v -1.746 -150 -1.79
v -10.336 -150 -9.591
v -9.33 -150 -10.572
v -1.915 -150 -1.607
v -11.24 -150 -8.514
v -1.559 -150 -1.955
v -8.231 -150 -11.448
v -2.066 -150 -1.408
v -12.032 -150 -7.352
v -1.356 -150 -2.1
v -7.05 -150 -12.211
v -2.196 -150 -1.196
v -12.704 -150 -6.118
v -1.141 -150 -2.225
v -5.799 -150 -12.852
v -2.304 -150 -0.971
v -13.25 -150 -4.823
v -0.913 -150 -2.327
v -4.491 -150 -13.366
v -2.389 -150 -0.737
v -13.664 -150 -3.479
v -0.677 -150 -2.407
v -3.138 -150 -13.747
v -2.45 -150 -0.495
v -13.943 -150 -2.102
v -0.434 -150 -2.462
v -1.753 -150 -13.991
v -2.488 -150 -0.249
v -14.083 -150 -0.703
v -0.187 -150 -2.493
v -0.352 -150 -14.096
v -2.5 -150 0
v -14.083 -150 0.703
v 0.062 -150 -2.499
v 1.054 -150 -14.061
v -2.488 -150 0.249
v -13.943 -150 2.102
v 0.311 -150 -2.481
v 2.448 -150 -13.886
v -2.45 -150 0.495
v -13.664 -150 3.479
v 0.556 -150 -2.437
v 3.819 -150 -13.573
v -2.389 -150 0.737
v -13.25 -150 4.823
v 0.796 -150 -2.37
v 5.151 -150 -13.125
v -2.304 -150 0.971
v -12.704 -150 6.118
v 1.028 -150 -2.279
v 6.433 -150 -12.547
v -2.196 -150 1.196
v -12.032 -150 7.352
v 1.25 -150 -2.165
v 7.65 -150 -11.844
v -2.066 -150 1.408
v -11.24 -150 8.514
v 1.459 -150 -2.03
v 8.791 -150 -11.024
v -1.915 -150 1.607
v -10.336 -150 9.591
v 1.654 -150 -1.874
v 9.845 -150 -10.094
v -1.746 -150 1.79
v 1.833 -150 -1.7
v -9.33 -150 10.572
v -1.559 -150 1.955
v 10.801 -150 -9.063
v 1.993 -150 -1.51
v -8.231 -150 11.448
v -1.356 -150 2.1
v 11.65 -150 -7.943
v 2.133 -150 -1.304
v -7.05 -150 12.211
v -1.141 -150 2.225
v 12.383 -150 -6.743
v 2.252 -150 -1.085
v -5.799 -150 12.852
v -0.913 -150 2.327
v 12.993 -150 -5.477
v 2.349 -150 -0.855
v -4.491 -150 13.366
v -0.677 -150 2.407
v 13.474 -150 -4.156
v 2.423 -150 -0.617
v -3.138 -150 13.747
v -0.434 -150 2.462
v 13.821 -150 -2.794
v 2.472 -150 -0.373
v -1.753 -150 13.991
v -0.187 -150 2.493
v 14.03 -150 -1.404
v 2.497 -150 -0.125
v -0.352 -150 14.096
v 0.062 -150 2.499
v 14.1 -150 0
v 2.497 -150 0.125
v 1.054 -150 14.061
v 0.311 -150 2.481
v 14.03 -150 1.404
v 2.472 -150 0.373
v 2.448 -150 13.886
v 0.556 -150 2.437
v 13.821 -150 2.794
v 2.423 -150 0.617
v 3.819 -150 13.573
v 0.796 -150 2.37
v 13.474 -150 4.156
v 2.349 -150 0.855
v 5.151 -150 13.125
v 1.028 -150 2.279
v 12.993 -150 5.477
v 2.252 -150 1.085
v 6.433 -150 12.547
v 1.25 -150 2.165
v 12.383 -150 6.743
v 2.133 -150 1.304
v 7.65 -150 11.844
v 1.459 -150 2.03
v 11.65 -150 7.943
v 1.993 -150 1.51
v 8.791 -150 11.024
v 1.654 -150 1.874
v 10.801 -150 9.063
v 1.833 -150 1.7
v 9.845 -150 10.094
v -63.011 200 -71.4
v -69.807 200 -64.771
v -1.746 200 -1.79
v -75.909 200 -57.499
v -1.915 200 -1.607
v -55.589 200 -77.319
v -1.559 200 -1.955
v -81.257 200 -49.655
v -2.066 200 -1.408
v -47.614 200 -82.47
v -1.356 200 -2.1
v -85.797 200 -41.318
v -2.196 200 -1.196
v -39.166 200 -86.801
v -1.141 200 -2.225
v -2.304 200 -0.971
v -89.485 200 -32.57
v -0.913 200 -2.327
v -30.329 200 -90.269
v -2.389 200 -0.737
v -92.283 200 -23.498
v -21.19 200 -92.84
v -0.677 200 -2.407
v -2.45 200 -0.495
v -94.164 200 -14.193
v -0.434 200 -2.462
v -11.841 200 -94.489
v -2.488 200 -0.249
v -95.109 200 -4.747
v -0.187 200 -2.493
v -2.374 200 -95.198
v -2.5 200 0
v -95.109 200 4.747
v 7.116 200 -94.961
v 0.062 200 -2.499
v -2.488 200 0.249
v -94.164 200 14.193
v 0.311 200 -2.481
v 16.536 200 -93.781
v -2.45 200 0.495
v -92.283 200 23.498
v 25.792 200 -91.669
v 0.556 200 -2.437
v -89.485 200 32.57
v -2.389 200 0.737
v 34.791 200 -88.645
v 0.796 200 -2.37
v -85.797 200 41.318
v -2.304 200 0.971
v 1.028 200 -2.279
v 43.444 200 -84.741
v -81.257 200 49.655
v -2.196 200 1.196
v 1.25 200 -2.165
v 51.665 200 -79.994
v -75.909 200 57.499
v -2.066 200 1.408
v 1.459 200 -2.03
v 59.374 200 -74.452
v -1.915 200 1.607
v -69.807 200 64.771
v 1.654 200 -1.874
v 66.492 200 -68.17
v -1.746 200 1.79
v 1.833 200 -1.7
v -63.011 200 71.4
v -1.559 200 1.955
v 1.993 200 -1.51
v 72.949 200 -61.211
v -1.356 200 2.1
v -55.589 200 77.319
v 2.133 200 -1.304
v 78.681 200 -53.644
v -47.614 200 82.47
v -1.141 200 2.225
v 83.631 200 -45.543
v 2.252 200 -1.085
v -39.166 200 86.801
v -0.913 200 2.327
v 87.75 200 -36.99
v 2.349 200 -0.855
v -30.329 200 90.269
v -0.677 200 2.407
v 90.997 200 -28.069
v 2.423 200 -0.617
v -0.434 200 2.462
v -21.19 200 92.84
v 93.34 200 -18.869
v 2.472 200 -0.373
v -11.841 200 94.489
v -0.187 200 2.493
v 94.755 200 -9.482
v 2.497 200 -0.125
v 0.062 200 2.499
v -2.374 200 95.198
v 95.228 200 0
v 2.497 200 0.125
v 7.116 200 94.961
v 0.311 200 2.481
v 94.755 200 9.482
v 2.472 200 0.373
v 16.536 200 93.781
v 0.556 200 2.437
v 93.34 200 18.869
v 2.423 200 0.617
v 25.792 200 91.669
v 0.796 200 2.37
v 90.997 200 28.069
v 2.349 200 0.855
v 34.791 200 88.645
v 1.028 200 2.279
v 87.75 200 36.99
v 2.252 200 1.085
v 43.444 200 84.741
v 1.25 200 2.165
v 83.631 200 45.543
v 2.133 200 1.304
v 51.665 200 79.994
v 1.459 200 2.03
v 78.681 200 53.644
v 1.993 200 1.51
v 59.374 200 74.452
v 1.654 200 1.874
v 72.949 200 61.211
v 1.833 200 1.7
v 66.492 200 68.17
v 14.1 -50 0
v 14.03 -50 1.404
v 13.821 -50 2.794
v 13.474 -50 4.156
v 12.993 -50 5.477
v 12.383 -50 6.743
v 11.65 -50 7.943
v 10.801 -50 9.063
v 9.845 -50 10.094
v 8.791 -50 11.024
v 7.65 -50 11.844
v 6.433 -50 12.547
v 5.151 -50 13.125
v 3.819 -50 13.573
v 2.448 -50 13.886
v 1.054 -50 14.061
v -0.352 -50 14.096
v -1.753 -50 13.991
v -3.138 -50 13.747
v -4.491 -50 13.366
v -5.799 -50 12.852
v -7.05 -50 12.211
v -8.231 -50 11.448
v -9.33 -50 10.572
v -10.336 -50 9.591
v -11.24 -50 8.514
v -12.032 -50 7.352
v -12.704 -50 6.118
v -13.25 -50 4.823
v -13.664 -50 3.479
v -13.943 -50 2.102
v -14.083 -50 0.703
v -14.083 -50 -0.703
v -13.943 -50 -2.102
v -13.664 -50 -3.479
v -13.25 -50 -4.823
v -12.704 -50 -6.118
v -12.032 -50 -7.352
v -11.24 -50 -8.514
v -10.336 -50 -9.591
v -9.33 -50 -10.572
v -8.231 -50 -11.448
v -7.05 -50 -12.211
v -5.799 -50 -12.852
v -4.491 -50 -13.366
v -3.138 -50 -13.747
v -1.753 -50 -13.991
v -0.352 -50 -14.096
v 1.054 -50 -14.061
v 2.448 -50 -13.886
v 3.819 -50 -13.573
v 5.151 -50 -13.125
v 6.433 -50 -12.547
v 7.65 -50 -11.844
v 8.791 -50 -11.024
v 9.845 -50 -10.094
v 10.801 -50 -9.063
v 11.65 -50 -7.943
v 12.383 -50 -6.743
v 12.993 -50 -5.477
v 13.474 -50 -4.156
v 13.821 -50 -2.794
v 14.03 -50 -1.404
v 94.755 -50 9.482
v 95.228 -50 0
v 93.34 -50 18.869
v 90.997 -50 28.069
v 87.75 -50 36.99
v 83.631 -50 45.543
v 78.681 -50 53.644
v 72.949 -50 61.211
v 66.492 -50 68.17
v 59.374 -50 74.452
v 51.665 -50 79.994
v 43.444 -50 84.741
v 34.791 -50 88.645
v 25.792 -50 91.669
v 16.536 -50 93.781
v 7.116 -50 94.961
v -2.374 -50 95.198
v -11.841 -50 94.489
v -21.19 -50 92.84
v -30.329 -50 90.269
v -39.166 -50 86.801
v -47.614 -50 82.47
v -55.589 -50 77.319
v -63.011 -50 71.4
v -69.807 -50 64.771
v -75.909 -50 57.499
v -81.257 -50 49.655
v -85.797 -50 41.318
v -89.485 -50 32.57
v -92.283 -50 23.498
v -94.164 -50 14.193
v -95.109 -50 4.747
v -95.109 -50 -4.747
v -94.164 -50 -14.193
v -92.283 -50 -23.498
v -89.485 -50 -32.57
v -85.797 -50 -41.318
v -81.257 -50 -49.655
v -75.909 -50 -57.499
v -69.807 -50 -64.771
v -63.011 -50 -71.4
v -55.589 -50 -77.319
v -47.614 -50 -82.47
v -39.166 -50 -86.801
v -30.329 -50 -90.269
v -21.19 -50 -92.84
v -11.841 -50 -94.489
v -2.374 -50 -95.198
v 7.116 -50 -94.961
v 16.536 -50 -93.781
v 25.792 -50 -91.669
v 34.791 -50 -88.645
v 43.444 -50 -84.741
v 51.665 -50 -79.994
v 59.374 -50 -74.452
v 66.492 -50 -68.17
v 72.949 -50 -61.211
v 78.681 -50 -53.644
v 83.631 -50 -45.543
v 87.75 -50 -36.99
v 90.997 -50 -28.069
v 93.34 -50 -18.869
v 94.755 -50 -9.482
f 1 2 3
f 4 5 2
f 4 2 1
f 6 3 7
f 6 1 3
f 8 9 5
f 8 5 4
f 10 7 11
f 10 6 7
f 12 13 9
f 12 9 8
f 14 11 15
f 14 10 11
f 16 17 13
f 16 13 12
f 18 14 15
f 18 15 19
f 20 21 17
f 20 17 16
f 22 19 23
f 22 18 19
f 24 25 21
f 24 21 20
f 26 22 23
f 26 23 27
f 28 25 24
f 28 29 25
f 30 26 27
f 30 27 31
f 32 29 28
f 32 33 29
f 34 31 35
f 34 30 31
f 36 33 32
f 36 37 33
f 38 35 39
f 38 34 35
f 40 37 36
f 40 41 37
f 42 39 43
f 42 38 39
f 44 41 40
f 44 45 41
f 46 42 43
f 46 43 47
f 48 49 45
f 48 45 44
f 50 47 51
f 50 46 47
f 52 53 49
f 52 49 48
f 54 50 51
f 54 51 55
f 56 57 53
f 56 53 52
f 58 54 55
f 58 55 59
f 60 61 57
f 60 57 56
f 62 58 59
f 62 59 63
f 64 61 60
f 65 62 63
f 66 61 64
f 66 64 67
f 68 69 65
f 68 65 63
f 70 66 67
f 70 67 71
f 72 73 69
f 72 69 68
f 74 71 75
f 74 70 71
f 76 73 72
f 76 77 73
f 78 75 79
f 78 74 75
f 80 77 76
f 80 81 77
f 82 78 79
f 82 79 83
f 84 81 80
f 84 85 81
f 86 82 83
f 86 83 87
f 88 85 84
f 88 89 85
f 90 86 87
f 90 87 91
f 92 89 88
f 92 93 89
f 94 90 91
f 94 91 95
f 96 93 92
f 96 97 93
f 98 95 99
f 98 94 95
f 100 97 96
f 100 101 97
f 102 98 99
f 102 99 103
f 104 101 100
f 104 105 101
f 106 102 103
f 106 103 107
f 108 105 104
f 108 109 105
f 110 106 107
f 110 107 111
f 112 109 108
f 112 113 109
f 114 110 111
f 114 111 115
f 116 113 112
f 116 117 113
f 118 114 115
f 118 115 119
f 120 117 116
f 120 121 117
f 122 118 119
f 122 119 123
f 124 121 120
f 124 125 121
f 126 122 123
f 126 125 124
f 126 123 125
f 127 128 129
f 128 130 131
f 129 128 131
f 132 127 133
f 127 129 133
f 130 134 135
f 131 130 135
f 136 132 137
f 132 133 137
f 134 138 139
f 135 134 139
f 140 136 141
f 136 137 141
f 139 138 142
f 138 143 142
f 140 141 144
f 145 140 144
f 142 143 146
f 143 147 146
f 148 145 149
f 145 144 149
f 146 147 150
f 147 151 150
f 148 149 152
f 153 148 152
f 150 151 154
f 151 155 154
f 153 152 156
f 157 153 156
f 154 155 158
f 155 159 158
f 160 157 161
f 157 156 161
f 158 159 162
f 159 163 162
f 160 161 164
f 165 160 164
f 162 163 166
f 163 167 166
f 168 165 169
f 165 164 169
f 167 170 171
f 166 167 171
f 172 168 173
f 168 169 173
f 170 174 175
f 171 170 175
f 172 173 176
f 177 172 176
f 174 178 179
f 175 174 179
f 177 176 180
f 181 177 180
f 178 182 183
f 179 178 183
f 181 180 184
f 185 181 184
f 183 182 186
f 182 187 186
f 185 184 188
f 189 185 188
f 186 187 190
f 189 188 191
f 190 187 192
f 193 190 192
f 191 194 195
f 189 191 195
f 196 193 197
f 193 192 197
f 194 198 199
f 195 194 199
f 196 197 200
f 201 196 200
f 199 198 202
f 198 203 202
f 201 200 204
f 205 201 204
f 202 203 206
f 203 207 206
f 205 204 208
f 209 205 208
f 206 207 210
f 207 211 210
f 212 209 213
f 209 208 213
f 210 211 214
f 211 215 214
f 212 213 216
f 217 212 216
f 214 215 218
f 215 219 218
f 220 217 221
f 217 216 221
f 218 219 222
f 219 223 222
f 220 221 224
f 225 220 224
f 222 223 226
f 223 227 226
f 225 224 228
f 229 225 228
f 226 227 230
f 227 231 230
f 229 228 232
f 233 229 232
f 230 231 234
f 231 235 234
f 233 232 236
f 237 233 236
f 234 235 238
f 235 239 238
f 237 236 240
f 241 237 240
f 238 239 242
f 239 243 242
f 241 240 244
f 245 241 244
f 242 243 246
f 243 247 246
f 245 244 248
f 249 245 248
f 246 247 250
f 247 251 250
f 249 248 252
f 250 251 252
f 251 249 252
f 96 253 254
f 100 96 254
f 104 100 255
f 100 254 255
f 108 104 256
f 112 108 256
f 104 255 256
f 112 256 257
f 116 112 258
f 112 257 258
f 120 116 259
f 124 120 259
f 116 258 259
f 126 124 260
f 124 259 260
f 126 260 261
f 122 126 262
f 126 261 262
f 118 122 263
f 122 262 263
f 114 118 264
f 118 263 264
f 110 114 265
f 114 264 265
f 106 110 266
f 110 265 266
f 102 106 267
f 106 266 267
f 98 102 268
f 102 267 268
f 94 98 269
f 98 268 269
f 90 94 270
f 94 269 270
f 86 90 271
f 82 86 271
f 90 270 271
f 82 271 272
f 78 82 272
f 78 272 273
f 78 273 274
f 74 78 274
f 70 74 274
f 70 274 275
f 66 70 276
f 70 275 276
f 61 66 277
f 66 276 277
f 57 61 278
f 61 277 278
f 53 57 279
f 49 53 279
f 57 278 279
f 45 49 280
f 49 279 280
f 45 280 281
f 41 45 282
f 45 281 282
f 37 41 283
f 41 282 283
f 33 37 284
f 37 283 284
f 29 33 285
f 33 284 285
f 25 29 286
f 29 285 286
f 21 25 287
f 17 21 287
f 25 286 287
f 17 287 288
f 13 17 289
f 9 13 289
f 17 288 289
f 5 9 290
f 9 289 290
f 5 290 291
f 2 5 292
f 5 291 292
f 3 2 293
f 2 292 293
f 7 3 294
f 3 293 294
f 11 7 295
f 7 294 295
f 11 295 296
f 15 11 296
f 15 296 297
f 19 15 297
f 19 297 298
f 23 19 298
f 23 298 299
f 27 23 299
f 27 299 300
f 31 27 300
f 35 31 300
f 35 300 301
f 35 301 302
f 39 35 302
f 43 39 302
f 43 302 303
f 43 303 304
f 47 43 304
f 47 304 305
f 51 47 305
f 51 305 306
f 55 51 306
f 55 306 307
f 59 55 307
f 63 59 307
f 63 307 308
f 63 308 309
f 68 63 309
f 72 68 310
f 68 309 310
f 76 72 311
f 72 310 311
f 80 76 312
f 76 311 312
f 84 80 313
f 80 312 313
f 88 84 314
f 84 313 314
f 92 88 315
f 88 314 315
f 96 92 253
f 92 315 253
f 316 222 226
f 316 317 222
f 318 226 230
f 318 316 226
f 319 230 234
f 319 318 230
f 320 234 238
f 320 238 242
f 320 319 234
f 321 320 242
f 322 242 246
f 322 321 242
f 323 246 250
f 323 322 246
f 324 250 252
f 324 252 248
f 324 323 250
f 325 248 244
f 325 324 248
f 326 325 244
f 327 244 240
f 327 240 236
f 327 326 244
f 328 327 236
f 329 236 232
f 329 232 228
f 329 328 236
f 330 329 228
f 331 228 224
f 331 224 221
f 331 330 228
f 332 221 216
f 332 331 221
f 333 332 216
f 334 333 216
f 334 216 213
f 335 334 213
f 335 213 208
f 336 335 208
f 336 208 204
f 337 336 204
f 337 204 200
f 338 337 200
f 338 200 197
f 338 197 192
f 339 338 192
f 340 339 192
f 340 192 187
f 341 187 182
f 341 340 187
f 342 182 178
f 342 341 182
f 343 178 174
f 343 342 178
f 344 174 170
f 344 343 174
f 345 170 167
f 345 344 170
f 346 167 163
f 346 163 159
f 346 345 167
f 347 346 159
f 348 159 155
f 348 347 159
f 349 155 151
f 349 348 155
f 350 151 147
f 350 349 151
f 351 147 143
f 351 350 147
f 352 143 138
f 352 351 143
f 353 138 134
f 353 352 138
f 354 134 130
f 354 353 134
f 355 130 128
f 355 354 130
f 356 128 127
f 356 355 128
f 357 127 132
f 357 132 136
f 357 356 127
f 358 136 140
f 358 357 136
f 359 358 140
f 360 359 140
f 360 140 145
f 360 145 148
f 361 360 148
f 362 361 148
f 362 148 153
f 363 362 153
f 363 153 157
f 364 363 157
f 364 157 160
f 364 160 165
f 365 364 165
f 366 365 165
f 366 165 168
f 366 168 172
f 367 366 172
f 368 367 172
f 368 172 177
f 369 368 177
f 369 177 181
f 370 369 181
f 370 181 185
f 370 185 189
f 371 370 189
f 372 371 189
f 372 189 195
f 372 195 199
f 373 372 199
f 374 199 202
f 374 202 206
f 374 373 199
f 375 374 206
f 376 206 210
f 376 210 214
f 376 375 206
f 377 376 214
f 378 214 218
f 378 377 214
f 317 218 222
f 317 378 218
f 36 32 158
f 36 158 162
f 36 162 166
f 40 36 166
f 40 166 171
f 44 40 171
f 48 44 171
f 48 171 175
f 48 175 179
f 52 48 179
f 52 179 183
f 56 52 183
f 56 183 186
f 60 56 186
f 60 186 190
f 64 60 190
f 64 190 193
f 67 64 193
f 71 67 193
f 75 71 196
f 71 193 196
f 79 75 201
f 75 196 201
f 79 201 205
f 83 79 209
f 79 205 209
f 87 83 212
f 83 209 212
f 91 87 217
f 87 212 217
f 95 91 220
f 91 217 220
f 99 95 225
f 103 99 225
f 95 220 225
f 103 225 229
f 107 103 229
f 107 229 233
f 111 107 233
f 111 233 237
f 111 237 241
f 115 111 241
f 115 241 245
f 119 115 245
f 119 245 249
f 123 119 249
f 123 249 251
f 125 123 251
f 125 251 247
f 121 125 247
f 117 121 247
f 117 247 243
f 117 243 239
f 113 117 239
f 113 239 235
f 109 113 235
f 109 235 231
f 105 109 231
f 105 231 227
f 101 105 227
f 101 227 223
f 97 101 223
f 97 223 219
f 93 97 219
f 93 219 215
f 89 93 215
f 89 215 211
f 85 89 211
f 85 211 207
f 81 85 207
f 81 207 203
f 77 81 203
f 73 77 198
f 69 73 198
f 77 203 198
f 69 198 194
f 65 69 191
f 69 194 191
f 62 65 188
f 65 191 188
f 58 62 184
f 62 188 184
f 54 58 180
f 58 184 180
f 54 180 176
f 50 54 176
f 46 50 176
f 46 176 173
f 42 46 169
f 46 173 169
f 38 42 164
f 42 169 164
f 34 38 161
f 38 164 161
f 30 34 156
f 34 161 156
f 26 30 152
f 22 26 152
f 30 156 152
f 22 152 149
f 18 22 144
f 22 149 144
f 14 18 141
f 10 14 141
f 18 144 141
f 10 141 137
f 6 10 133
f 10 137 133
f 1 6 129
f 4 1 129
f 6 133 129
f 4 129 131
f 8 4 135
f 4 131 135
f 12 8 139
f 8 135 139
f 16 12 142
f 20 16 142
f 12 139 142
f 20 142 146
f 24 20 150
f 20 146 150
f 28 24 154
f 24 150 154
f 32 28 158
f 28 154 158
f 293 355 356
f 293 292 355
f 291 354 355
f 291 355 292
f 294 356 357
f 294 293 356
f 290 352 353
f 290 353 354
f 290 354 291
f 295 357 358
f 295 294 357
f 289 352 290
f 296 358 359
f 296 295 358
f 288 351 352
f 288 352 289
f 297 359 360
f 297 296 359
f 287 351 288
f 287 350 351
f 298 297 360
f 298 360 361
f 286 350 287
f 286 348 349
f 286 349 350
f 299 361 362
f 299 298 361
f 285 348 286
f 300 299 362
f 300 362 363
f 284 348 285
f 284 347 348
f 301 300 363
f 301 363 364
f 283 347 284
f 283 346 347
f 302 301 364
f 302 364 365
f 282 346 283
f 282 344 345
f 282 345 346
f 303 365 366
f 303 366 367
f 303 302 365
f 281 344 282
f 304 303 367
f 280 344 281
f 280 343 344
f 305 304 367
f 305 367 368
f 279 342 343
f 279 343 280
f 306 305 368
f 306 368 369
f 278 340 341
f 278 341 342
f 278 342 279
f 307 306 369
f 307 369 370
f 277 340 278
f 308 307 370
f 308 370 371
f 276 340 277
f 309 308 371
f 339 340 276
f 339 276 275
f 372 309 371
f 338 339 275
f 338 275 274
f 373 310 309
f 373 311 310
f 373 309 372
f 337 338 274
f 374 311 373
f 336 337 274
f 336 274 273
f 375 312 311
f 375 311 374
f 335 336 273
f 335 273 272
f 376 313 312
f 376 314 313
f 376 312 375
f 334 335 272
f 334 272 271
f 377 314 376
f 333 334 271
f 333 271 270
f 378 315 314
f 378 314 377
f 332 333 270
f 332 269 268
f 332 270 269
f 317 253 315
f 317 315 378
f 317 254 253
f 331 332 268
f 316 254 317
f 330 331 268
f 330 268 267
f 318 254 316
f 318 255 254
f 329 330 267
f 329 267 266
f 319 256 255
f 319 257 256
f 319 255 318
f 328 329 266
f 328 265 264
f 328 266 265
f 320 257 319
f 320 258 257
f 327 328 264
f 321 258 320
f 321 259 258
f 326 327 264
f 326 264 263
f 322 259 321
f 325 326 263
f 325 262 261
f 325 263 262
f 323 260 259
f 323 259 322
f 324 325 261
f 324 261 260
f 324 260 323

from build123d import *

# Parameters (mm, degrees)
F0_R     = 95.2277676599
F1_DEPTH = 50
F2_R     = 14.1001536821
F3_DEPTH = 100
F4_DEPTH = 200
F6_D     = 5


with BuildPart() as f1:
    # F0 (on Front) → F1 (new body)
    with BuildSketch(Plane.XZ):
        Circle(F0_R)
    extrude(amount=F1_DEPTH)

    # F2 (on face) → F3 (join)
    with BuildSketch(Plane.XZ.offset(50)):
        Circle(F2_R)
    extrude(amount=F3_DEPTH)

    # F4 (add): a face of the model
    f4_faces = [f1.faces().sort_by_distance(p)[0] for p in [
        (0, 0, 0),
    ]]
    extrude(f4_faces, amount=F4_DEPTH)

    # F6 (through all)
    with Locations(Plane.XZ.offset(150)):
        with Locations((0, 0)):
            Hole(F6_D / 2)


solid = f1.part
